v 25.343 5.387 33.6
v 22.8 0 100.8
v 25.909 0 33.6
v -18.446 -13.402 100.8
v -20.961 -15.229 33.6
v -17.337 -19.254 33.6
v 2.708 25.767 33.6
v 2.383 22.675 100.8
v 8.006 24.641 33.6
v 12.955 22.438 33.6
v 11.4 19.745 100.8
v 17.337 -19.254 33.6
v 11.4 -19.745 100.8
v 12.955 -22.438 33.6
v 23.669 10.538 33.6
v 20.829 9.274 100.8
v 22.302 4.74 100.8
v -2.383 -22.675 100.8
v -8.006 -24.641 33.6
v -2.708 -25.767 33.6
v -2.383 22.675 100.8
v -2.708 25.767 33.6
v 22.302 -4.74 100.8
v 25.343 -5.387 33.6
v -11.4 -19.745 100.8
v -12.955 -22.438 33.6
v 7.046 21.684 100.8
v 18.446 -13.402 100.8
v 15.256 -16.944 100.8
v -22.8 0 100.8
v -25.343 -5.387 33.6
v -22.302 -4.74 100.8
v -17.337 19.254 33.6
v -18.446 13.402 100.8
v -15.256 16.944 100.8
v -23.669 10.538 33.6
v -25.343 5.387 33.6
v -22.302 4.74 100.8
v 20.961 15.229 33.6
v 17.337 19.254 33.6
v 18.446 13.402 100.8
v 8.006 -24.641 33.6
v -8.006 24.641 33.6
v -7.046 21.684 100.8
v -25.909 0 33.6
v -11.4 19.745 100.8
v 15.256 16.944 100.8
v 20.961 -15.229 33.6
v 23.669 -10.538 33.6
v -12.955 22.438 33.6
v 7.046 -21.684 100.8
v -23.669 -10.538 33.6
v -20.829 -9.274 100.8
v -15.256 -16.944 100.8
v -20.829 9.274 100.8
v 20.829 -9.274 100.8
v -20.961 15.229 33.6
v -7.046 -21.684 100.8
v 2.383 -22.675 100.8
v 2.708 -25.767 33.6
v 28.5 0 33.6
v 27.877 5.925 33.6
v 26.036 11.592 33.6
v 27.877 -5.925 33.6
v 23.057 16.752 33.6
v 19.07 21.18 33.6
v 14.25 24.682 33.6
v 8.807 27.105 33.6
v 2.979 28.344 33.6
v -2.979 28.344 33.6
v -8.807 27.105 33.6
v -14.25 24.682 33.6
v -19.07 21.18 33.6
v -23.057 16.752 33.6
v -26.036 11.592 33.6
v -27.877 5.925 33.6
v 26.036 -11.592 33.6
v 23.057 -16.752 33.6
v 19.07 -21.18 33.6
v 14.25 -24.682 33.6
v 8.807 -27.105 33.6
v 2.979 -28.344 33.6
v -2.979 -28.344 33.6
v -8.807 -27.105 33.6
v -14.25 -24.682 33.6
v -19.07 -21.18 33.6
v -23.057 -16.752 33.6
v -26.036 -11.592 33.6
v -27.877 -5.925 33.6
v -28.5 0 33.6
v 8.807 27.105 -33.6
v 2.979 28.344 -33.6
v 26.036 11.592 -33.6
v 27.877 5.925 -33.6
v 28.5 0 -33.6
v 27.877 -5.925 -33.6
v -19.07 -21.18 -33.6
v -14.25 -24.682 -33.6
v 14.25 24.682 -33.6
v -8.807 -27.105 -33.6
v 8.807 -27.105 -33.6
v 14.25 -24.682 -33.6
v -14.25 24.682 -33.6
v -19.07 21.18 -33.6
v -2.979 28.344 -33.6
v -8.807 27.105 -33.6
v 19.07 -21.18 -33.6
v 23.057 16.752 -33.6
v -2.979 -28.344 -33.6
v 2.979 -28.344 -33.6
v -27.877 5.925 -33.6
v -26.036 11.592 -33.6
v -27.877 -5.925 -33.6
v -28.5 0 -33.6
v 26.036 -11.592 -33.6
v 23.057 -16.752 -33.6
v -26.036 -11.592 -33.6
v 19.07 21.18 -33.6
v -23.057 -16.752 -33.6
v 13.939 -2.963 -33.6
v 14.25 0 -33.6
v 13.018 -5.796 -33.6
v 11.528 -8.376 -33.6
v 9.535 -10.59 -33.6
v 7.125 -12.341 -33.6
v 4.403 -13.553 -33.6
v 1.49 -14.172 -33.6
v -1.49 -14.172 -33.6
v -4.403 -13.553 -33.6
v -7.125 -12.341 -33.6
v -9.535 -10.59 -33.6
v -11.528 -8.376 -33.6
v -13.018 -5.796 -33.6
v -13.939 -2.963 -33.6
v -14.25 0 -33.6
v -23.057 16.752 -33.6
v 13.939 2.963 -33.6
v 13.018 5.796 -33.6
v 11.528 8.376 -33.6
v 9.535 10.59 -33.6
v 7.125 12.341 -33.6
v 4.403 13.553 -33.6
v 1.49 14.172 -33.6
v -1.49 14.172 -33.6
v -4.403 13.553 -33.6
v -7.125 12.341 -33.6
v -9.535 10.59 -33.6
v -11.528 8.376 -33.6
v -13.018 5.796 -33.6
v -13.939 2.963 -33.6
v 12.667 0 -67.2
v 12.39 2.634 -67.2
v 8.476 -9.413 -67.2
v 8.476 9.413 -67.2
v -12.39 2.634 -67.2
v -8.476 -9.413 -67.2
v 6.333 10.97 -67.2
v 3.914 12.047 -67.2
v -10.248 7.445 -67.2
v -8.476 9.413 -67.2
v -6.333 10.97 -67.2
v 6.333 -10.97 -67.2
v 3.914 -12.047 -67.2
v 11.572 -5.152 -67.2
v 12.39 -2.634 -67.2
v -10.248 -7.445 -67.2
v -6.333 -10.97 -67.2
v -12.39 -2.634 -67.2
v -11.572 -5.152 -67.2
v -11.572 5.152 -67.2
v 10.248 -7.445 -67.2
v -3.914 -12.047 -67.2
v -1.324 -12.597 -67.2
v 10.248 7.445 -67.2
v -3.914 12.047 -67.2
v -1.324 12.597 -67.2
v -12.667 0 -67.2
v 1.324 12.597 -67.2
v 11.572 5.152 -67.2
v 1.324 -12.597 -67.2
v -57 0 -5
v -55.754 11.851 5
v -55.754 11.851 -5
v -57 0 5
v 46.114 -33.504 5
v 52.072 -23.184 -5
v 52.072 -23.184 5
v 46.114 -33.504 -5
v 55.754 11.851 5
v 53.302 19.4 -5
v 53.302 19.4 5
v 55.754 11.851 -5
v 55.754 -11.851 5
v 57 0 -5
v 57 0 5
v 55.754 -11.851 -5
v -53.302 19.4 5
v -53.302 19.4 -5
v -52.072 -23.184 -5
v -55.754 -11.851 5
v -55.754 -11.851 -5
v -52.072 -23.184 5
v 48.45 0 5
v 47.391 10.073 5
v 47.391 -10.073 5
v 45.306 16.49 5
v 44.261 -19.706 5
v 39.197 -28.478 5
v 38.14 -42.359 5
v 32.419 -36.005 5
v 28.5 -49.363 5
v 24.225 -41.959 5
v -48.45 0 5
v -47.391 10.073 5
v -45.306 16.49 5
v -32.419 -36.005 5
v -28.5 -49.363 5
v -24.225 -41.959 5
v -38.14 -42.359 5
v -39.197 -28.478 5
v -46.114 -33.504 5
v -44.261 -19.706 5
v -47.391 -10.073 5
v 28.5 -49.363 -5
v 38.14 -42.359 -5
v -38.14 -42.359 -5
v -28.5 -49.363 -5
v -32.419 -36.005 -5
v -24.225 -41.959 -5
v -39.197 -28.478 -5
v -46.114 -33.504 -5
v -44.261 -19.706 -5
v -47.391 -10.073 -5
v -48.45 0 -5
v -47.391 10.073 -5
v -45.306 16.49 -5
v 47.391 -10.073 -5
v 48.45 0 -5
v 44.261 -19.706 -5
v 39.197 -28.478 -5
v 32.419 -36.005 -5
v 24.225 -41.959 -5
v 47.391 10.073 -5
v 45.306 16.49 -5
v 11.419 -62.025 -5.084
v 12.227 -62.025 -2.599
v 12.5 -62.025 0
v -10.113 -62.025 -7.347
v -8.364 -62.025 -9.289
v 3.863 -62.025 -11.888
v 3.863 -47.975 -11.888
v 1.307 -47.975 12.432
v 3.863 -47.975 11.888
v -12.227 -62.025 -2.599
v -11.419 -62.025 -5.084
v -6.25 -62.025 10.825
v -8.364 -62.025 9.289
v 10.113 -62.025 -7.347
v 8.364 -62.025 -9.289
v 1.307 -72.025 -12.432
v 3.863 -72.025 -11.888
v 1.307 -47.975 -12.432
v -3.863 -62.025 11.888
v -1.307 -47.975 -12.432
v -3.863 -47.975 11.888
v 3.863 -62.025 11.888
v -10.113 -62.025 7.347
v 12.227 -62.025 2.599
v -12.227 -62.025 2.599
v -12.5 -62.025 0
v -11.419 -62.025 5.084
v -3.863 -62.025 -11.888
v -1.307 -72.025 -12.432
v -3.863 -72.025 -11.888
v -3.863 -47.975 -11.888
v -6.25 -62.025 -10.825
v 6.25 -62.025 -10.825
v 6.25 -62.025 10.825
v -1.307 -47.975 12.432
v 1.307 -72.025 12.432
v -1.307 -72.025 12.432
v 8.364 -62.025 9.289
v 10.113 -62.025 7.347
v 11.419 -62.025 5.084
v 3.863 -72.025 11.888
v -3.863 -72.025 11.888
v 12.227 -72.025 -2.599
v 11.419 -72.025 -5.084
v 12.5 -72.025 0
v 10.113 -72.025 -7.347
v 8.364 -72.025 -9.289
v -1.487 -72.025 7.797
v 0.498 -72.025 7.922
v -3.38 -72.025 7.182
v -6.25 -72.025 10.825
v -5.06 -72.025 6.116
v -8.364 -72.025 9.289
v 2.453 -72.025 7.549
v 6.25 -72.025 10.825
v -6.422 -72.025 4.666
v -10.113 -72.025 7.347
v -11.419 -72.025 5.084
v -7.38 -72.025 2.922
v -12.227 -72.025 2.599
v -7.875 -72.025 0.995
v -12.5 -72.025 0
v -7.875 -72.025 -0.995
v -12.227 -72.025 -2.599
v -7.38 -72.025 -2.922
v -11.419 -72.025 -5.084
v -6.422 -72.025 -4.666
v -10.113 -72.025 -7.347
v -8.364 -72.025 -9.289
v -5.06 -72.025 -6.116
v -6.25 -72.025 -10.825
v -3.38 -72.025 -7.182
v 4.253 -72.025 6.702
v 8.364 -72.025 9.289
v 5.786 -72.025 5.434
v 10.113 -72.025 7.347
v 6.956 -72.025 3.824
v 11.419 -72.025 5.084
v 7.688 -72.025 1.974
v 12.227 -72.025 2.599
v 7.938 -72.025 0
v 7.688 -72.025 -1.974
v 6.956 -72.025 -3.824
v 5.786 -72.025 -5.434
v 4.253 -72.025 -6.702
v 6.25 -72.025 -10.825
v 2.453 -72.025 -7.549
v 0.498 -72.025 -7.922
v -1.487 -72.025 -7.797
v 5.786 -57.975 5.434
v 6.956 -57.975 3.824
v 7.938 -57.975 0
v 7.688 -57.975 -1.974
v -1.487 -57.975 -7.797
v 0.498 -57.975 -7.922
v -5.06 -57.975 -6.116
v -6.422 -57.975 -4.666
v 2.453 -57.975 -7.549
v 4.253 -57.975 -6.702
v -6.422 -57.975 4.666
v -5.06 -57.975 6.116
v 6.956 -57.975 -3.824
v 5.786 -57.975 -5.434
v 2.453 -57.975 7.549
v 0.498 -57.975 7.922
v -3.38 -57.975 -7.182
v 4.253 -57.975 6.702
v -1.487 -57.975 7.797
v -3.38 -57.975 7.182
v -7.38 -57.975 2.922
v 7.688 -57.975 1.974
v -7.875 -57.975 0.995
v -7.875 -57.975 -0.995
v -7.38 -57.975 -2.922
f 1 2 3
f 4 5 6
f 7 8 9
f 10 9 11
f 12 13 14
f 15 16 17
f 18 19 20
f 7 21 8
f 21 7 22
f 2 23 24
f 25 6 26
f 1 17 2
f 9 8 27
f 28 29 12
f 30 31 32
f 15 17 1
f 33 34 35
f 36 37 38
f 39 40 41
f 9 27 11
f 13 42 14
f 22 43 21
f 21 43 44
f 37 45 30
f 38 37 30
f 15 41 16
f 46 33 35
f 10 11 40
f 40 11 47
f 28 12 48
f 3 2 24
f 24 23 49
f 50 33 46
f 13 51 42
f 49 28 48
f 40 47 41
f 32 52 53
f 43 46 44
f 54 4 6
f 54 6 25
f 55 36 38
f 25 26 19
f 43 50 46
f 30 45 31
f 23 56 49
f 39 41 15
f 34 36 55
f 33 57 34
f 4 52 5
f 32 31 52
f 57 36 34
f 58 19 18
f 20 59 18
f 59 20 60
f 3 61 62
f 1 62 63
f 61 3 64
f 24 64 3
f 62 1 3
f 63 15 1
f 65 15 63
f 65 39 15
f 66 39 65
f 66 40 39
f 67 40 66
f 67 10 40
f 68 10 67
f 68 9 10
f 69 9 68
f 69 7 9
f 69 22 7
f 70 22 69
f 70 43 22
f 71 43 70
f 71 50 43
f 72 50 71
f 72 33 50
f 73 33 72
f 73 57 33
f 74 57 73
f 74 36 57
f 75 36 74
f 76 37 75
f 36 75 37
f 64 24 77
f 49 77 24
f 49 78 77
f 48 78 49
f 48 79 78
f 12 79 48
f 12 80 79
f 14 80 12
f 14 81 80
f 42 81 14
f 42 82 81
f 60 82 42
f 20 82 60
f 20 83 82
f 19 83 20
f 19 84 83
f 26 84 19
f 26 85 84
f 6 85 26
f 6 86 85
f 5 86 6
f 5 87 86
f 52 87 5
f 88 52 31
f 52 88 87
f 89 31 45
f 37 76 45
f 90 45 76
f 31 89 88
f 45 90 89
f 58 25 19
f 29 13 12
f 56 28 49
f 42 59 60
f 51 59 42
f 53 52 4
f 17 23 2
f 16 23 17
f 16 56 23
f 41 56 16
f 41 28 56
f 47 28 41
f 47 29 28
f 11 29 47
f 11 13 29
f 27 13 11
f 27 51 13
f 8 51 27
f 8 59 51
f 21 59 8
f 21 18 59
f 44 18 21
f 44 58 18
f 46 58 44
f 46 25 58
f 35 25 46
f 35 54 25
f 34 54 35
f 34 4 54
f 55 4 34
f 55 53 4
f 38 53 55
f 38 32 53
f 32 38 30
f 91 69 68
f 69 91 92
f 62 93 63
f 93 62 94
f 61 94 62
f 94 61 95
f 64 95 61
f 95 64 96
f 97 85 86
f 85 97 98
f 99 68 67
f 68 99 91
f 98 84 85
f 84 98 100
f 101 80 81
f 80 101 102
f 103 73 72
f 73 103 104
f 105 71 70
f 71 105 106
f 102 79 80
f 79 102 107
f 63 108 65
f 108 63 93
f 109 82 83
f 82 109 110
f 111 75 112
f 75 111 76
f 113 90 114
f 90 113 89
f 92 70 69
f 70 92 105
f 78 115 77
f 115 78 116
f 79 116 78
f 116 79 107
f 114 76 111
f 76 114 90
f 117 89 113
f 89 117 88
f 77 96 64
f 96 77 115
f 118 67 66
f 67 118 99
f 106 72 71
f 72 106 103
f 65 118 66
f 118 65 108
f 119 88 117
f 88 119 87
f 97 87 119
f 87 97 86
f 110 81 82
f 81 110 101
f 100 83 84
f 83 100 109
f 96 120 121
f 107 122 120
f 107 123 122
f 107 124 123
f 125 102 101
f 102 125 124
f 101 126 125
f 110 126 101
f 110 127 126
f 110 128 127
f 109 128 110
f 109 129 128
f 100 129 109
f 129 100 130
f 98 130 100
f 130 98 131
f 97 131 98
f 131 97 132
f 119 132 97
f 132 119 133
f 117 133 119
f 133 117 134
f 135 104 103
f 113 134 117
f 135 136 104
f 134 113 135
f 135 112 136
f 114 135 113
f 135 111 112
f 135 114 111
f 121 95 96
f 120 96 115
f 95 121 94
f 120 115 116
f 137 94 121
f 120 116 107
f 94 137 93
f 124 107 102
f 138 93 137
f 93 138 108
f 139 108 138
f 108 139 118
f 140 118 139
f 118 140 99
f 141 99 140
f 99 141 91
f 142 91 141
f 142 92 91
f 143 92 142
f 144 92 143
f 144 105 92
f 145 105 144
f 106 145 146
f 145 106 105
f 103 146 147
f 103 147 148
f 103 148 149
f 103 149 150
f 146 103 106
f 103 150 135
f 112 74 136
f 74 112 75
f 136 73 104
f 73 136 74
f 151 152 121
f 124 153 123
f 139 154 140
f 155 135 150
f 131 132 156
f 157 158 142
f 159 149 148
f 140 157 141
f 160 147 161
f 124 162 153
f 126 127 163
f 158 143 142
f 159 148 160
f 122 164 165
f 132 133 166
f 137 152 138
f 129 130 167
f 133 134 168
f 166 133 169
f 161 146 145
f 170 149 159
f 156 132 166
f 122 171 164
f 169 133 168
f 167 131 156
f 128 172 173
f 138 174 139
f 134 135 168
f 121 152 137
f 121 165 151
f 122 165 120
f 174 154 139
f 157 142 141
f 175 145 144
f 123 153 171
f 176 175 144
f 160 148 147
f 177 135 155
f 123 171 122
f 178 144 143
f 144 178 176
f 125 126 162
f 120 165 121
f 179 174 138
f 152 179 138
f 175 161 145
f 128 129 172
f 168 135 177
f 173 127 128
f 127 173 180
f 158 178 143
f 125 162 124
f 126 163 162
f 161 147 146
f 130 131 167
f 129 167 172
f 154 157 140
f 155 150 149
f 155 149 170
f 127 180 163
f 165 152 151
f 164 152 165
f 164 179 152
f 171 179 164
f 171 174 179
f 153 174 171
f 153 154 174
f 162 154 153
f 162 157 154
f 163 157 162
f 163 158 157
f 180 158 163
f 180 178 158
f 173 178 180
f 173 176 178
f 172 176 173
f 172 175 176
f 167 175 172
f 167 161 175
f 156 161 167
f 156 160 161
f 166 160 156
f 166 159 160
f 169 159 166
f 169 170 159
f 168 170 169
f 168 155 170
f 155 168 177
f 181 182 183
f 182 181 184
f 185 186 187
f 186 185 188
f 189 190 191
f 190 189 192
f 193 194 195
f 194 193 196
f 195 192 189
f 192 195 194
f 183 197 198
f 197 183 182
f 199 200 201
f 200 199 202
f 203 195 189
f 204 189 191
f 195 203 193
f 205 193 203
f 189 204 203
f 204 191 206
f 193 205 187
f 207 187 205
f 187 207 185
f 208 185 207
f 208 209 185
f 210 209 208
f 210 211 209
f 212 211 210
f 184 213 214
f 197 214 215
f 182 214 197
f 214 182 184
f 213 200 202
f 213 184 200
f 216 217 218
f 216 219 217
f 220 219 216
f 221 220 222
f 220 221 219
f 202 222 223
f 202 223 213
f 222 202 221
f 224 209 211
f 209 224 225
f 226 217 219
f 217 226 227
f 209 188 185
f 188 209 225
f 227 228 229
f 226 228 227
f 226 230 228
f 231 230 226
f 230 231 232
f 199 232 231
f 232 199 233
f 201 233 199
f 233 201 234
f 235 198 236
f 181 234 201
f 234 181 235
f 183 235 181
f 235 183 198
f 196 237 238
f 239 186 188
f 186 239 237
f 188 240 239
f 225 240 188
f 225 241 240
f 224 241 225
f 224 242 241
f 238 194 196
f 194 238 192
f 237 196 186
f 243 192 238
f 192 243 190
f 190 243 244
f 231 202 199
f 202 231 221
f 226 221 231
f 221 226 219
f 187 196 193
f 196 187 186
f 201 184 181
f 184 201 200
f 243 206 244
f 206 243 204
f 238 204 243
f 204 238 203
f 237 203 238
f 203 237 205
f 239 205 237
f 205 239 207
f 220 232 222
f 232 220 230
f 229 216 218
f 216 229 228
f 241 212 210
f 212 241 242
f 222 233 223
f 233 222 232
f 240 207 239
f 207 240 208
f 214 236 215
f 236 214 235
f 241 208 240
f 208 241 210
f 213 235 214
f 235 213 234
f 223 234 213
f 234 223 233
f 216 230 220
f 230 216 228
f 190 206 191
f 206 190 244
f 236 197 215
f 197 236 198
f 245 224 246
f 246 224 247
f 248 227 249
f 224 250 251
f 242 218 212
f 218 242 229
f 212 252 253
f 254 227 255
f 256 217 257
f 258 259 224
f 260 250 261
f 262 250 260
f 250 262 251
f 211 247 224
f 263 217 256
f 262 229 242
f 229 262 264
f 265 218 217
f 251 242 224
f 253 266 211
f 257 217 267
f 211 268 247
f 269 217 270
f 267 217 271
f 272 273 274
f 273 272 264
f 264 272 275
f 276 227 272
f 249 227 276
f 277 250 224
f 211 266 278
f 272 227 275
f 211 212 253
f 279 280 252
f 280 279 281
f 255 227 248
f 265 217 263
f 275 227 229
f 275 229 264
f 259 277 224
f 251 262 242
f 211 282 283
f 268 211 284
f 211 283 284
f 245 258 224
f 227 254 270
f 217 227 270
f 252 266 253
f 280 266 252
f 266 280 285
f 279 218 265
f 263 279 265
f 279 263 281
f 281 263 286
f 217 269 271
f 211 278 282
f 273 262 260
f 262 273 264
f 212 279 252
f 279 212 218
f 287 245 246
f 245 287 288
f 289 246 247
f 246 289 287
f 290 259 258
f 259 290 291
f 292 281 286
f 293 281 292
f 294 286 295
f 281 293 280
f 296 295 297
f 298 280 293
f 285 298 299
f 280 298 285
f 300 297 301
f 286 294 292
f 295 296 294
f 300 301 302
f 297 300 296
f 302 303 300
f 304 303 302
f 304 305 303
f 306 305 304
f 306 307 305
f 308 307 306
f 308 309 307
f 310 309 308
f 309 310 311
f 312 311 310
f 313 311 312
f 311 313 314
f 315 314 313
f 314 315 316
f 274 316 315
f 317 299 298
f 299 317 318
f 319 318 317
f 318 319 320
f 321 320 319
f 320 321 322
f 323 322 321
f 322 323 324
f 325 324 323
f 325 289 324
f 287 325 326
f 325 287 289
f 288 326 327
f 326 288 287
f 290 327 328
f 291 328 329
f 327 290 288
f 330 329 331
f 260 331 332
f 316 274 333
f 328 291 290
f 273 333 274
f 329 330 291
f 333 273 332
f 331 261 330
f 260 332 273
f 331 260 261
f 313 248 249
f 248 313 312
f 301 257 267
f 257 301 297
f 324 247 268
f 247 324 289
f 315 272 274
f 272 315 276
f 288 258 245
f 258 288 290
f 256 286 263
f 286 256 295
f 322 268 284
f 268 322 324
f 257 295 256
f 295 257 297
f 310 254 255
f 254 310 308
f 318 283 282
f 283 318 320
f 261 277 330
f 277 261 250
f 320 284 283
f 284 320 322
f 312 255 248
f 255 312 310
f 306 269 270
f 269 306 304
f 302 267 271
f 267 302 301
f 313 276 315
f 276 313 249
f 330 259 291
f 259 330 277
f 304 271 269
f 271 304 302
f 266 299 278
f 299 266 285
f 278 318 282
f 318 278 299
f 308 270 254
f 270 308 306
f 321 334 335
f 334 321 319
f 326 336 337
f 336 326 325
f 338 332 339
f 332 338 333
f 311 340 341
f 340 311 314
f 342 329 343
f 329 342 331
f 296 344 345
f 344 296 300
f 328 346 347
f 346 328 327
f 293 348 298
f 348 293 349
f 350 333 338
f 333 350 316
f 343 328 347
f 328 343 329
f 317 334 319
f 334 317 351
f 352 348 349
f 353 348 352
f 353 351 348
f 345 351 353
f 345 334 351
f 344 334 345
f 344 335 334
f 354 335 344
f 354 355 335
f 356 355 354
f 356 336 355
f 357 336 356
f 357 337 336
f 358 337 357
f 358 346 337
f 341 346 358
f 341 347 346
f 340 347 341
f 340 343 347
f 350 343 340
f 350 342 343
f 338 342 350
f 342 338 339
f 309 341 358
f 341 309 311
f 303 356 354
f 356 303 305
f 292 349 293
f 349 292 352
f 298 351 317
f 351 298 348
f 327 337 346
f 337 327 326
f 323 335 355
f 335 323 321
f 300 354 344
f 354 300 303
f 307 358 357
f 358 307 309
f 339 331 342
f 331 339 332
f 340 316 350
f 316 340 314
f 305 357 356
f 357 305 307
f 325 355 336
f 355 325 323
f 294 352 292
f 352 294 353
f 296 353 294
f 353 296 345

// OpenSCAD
use <MCAD/triangles.scad>

//sE X1R dimensions
//ø57mm
//l.168mm
//455g

angle=140;
angle2=300;
notchLength=70;

micw = 57;
micl = 168;

module x1r() {
	translate([0,0,(micl/5)*2])
	cylinder(r1=micw/2.2,r2=micw/2.5,h=(micl/5)*2,center=true);
	translate([0,0,0])
	cylinder(r=micw/2,h=(micl/5)*2,center=true);
	translate([0,0,-(micl/5)*1.5])
	cylinder(r1=micw/4.5,r2=micw/4,h=micl/5,center=true);
}

x1r();
 	
module topNotch() {
	union() {
		translate([0,notchLength,-7])
		rotate([0,0,-90])
			a_triangle(angle/2,notchLength,14);
		translate([0,notchLength,7])
		rotate([0,180,-270])
			a_triangle(angle/2,notchLength,14);		
		translate([0,52,0])
			cube([1,10,14],center=true);
	}
}

module topNotch2() {
	union() {
		translate([0,notchLength,-7])
		rotate([0,0,-90])
			a_triangle(angle2/2,notchLength,14);
		translate([0,notchLength,7])
		rotate([0,180,-270])
			a_triangle(angle2/2,notchLength,14);		
		translate([0,52,0])
			cube([1,10,14],center=true);
	}
}

module outerRing() {
	difference() {
		difference() {
			cylinder(r=micw,h=10,center=true);
			cylinder(r=micw*0.85,h=11,center=true);
		}
		topNotch();
	}
}

module ringBack() {
	difference() {
		union() {
			hull() {
				intersection() {
					difference() {
						cylinder(r=micw,h=10,center=true);
						cylinder(r=micw*0.85,h=11,center=true);
					}
					topNotch2();
				}
				translate([0,55,0])
				rotate([90,0,0])
					cylinder(r=12.5,h=14.05,center=true);
			}
			translate([0,60,0])
			rotate([90,0,0])
				cylinder(r=12.5,h=24.05,center=true);
		}	
		translate([0,70,0])
		rotate([90,0,0])
			cylinder(r=7.9375,h=24.05,center=true);	
	}
}

outerRing();

rotate([180,0,0])
ringBack();
